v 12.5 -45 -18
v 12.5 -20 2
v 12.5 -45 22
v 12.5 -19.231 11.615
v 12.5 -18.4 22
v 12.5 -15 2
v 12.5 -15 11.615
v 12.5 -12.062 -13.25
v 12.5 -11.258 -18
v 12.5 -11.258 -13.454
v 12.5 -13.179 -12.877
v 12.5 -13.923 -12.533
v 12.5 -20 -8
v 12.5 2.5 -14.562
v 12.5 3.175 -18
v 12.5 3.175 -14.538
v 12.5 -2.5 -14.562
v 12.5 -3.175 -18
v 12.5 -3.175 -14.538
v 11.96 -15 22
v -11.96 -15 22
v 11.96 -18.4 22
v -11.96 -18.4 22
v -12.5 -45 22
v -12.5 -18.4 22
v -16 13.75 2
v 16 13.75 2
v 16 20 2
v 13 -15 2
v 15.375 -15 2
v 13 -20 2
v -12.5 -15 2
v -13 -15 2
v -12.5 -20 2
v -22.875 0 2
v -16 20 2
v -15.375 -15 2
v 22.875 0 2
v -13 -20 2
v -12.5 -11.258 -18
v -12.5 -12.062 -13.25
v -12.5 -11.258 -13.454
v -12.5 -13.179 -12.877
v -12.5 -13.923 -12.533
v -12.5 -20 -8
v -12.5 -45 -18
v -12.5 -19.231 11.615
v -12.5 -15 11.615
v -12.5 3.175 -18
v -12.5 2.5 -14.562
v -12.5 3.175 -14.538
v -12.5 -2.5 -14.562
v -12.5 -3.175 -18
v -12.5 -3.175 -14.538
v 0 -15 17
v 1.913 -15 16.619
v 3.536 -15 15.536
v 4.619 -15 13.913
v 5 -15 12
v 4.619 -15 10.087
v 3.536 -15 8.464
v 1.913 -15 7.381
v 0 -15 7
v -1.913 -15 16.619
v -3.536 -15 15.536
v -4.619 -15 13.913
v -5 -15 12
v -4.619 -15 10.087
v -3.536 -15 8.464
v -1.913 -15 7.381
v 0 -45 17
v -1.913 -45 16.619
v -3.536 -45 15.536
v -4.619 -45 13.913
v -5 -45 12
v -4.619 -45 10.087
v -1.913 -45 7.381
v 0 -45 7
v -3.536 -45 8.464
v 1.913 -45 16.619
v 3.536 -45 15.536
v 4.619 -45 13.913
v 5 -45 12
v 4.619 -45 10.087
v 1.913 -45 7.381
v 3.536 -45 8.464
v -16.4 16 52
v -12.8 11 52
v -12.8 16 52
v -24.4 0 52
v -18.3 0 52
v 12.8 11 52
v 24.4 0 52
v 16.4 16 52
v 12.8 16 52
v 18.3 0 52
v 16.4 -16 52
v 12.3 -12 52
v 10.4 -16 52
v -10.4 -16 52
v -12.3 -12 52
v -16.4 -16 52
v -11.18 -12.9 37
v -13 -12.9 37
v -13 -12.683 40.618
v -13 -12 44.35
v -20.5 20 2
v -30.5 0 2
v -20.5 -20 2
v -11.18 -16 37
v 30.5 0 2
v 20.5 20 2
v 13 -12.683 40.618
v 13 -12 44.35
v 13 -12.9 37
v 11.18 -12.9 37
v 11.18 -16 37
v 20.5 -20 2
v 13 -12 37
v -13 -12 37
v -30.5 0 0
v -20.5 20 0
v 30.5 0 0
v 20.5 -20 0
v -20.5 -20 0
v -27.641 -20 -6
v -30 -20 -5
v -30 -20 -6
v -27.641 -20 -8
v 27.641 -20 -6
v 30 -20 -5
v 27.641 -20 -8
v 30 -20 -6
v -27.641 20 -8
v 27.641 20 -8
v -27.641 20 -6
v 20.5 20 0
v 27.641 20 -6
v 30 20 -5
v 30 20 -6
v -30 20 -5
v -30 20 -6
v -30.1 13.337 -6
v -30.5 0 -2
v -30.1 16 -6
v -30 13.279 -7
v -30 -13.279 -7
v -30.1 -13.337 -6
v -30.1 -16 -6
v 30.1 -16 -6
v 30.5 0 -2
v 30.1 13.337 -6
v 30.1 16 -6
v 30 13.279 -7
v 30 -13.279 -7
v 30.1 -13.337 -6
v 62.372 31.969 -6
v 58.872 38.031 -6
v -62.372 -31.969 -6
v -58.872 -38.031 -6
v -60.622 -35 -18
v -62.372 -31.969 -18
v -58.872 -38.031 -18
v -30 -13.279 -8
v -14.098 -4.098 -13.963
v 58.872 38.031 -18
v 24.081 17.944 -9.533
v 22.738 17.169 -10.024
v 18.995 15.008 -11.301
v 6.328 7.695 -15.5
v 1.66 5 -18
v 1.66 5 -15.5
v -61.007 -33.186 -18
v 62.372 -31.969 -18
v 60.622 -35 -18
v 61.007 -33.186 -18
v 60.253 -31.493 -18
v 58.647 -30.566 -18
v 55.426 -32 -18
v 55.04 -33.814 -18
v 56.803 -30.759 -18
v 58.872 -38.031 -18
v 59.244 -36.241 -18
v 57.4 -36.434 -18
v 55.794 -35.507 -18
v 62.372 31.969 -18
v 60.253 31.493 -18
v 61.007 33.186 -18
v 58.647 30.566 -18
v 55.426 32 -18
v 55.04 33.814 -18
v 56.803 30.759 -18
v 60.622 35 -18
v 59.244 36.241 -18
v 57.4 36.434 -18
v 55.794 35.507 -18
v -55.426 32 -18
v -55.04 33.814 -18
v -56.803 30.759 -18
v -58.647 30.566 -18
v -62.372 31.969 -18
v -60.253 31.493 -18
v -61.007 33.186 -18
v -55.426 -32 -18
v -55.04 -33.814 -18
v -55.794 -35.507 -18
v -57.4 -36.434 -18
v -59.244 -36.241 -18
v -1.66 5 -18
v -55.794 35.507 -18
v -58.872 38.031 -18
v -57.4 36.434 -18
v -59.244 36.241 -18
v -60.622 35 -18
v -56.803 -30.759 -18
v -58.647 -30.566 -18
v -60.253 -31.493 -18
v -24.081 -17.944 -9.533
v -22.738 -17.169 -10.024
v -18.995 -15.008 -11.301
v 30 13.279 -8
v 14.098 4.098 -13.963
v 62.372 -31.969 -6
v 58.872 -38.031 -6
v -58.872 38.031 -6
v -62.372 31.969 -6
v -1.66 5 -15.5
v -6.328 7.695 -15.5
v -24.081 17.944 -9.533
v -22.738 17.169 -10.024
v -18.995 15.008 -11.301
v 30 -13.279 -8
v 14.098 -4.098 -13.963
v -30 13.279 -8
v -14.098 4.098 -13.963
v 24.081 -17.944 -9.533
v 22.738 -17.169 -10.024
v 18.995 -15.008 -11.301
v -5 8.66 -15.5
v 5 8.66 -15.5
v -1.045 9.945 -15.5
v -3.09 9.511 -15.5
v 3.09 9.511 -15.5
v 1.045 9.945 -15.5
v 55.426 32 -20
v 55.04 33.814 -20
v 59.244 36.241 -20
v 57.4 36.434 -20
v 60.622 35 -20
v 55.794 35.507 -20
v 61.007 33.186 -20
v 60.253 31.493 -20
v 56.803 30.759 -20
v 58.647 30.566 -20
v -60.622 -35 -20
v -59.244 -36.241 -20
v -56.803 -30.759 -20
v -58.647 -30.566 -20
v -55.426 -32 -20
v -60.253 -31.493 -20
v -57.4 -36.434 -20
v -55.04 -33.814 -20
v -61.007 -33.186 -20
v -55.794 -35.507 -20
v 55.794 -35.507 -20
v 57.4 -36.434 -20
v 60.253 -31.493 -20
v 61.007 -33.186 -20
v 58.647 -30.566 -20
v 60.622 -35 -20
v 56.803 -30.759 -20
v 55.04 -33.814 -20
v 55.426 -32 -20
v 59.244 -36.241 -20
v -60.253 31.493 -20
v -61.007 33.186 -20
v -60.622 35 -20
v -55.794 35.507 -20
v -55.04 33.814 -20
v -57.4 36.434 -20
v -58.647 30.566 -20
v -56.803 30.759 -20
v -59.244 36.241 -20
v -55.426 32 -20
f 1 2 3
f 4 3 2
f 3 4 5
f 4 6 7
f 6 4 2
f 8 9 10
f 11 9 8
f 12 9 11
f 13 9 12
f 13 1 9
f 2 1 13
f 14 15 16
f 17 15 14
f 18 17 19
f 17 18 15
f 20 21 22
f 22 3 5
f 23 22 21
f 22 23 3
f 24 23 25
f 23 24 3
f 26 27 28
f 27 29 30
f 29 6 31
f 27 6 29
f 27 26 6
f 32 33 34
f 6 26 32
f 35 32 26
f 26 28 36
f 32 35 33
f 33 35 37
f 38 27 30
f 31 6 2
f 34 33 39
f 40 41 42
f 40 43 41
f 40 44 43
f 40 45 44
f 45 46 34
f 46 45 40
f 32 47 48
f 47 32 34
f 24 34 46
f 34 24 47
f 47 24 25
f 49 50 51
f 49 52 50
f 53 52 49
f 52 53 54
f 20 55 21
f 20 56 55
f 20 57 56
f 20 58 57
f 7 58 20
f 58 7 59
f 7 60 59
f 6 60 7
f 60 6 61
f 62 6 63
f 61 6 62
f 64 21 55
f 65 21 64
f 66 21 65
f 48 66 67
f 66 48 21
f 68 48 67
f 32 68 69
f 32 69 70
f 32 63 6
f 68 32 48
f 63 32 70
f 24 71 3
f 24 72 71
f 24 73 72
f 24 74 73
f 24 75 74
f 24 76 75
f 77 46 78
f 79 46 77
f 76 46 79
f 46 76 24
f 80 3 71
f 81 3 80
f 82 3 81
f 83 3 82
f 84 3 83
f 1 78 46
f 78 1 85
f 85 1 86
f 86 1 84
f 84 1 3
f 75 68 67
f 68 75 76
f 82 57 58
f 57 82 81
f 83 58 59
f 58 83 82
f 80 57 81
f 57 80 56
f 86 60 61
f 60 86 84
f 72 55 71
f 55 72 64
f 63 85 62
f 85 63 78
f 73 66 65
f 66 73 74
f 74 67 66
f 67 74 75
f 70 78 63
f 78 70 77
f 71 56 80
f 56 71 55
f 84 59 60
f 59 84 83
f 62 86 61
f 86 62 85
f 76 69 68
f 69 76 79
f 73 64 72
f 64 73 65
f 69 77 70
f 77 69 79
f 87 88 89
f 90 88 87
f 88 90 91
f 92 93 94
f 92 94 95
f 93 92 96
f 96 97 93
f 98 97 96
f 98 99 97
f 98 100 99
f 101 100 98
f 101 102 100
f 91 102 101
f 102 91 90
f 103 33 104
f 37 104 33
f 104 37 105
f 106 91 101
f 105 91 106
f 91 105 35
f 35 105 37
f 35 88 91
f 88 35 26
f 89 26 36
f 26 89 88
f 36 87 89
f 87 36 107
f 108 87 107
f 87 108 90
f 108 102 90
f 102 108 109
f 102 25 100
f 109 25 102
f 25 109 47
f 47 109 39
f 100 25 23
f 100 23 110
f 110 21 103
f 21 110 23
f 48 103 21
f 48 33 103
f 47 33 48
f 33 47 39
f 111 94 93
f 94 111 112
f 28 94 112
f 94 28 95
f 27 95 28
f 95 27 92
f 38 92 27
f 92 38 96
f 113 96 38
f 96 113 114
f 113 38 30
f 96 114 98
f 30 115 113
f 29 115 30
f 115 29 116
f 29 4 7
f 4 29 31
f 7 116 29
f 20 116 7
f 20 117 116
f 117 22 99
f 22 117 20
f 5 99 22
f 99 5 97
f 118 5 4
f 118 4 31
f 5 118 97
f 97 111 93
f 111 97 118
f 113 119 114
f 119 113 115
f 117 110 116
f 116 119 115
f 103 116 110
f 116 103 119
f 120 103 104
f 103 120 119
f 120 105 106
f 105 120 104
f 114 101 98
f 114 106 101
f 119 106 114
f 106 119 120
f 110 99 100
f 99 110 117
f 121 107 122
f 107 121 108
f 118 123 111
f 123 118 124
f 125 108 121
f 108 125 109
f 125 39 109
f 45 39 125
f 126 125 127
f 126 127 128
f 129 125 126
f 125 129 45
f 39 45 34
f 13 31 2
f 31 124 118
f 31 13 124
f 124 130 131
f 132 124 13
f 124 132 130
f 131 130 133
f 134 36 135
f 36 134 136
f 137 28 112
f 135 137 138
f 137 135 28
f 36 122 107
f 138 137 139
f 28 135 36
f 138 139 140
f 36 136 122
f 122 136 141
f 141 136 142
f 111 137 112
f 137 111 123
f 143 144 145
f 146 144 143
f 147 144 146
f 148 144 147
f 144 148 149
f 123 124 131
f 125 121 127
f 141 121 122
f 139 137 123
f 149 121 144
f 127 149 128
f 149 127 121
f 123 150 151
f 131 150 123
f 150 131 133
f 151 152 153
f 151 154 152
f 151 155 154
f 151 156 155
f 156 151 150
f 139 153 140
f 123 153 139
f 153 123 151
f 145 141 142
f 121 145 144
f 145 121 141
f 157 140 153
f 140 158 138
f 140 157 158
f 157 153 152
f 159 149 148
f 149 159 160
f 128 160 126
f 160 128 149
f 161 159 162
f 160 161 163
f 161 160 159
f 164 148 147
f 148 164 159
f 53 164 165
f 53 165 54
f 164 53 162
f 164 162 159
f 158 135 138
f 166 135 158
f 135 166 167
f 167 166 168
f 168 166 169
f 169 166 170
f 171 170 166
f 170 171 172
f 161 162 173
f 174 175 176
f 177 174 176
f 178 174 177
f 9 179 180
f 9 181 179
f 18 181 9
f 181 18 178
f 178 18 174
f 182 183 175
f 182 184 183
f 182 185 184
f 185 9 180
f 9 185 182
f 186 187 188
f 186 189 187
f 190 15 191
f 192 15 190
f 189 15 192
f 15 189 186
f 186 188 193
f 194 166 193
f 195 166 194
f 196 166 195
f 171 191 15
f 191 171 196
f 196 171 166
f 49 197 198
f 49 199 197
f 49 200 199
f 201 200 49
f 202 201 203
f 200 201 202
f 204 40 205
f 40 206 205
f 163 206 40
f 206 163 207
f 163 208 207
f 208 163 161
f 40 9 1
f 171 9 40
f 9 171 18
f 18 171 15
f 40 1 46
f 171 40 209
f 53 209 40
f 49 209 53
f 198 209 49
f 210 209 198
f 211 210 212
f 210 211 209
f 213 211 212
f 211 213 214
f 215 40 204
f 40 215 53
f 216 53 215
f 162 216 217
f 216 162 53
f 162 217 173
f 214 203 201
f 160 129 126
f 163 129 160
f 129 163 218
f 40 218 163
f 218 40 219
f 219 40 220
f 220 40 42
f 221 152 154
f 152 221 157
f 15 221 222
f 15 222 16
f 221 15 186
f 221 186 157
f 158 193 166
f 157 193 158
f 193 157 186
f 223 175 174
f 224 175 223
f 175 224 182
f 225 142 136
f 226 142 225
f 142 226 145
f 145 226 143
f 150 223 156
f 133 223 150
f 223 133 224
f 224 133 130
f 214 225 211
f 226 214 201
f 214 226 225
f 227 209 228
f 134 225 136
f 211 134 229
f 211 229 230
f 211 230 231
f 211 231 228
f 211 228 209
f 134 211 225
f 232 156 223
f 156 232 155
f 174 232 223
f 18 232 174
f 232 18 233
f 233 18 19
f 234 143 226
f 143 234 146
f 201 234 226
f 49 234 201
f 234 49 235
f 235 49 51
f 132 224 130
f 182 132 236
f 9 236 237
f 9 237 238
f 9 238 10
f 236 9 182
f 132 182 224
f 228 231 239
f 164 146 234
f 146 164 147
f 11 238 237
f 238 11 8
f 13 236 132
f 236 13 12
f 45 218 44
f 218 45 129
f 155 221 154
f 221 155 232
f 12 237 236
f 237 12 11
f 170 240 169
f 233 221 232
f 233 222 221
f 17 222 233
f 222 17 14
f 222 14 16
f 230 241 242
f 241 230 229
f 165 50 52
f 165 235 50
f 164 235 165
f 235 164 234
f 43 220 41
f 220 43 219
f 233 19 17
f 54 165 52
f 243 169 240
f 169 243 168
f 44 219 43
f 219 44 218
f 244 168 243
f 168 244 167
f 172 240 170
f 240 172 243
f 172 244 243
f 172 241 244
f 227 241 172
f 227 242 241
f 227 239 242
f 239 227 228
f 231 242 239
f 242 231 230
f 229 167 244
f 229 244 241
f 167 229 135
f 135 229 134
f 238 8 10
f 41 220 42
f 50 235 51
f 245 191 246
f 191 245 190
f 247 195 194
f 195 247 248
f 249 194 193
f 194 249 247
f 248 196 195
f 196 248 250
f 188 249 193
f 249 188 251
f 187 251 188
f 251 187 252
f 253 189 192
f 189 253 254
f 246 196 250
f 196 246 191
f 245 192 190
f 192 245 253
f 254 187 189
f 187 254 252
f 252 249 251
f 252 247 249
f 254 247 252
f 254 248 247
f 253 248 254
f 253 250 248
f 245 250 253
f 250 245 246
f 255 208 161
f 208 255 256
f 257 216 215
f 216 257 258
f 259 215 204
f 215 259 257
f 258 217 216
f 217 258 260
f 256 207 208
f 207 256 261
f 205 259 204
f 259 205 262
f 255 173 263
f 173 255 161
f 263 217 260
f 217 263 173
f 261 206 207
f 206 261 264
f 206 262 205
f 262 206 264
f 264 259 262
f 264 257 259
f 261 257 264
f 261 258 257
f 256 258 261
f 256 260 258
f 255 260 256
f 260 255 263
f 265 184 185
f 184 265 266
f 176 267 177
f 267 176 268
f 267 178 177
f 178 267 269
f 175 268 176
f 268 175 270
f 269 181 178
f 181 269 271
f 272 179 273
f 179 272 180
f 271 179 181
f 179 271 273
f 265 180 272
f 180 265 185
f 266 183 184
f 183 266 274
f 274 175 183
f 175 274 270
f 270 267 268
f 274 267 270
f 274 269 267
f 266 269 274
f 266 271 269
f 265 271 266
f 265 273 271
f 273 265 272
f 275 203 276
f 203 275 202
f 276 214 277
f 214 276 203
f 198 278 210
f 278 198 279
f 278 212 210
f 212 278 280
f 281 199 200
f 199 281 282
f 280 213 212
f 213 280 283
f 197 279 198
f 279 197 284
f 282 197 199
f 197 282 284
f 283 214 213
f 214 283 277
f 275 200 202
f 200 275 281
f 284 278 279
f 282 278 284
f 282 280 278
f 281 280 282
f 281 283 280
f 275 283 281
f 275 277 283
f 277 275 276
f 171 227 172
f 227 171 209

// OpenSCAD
//baseplate
%translate([-29.5,-20,50])difference(){
	cube([59,40,6]);
	color("green")translate([26,17,-1]){
		cube([7,26,8]);
		translate([3.5,0,0])cylinder(8,3.5,3.5);
	}
}
scale_factor = 0.8;
path_base_pillar =[[-20.5,-20],[20.5,-20],[30.5,0],[20.5,20],[-20.5,20],[-30.5,0]];
// hexagonal pillars
translate([0,0,2]) linear_extrude(height = 50, center = false, convexity = 10, scale=scale_factor)
difference(){
	color("red") polygon(path_base_pillar);
	polygon(path_base_pillar*0.75);
	color("green")translate([0,18,0])square([32,10],true);
	color("green")translate([0,-18,0])square([26,10],true);
}
// linking block
color("purple")translate([-13,-16,37])cube([26,4,15]);

color("DarkKhaki")
translate([0,0,0])linear_extrude(height = 2, center = false, convexity = 10)
polygon(path_base_pillar);

color("steelblue")hull(){
	translate([0,0,-2])linear_extrude(height = 2, center = false, convexity = 10)
	polygon(path_base_pillar);
	translate([0,0,-6])cube([60,40,2], true);
}
// legs
color("gray")translate([0,0,-12])rotate([0,0,30])cube([140,7,12],true);
color("gray")translate([0,0,-12])rotate([0,0,-30])cube([140,7,12],true);

color("lime")hull(){
	translate([0,0,-7])cube([60,40,2], true);
	translate([0,0,-15])cylinder(1,10,10,true);
}



rotate([0,0,30])translate([67,0,-20])cylinder(2,3,3);
rotate([0,0,30])translate([-67,0,-20])cylinder(2,3,3);
rotate([0,0,-30])translate([67,0,-20])cylinder(2,3,3);
rotate([0,0,-30])translate([-67,0,-20])cylinder(2,3,3);
// linking to motor
/*
difference(){
	translate([0,-21,-12])cube([25,50,12],true);

	color("red") translate([0,-68,-18])
	linear_extrude(height = 12, center = false, convexity = 10)
	polygon([ [0,0], [8,30], [-8,30] ]);
}
*/

translate([-12.5,-45,-18])cube([25,50,12]);

color("red")translate([-12.5,-45,-6])cube([25,25,8]);
difference(){
	color("crimson")translate([-12.5,-45,2])cube([25,30,20]);
	translate([0,-15,12])rotate([90,0,0])cylinder(30,5,5);
}
